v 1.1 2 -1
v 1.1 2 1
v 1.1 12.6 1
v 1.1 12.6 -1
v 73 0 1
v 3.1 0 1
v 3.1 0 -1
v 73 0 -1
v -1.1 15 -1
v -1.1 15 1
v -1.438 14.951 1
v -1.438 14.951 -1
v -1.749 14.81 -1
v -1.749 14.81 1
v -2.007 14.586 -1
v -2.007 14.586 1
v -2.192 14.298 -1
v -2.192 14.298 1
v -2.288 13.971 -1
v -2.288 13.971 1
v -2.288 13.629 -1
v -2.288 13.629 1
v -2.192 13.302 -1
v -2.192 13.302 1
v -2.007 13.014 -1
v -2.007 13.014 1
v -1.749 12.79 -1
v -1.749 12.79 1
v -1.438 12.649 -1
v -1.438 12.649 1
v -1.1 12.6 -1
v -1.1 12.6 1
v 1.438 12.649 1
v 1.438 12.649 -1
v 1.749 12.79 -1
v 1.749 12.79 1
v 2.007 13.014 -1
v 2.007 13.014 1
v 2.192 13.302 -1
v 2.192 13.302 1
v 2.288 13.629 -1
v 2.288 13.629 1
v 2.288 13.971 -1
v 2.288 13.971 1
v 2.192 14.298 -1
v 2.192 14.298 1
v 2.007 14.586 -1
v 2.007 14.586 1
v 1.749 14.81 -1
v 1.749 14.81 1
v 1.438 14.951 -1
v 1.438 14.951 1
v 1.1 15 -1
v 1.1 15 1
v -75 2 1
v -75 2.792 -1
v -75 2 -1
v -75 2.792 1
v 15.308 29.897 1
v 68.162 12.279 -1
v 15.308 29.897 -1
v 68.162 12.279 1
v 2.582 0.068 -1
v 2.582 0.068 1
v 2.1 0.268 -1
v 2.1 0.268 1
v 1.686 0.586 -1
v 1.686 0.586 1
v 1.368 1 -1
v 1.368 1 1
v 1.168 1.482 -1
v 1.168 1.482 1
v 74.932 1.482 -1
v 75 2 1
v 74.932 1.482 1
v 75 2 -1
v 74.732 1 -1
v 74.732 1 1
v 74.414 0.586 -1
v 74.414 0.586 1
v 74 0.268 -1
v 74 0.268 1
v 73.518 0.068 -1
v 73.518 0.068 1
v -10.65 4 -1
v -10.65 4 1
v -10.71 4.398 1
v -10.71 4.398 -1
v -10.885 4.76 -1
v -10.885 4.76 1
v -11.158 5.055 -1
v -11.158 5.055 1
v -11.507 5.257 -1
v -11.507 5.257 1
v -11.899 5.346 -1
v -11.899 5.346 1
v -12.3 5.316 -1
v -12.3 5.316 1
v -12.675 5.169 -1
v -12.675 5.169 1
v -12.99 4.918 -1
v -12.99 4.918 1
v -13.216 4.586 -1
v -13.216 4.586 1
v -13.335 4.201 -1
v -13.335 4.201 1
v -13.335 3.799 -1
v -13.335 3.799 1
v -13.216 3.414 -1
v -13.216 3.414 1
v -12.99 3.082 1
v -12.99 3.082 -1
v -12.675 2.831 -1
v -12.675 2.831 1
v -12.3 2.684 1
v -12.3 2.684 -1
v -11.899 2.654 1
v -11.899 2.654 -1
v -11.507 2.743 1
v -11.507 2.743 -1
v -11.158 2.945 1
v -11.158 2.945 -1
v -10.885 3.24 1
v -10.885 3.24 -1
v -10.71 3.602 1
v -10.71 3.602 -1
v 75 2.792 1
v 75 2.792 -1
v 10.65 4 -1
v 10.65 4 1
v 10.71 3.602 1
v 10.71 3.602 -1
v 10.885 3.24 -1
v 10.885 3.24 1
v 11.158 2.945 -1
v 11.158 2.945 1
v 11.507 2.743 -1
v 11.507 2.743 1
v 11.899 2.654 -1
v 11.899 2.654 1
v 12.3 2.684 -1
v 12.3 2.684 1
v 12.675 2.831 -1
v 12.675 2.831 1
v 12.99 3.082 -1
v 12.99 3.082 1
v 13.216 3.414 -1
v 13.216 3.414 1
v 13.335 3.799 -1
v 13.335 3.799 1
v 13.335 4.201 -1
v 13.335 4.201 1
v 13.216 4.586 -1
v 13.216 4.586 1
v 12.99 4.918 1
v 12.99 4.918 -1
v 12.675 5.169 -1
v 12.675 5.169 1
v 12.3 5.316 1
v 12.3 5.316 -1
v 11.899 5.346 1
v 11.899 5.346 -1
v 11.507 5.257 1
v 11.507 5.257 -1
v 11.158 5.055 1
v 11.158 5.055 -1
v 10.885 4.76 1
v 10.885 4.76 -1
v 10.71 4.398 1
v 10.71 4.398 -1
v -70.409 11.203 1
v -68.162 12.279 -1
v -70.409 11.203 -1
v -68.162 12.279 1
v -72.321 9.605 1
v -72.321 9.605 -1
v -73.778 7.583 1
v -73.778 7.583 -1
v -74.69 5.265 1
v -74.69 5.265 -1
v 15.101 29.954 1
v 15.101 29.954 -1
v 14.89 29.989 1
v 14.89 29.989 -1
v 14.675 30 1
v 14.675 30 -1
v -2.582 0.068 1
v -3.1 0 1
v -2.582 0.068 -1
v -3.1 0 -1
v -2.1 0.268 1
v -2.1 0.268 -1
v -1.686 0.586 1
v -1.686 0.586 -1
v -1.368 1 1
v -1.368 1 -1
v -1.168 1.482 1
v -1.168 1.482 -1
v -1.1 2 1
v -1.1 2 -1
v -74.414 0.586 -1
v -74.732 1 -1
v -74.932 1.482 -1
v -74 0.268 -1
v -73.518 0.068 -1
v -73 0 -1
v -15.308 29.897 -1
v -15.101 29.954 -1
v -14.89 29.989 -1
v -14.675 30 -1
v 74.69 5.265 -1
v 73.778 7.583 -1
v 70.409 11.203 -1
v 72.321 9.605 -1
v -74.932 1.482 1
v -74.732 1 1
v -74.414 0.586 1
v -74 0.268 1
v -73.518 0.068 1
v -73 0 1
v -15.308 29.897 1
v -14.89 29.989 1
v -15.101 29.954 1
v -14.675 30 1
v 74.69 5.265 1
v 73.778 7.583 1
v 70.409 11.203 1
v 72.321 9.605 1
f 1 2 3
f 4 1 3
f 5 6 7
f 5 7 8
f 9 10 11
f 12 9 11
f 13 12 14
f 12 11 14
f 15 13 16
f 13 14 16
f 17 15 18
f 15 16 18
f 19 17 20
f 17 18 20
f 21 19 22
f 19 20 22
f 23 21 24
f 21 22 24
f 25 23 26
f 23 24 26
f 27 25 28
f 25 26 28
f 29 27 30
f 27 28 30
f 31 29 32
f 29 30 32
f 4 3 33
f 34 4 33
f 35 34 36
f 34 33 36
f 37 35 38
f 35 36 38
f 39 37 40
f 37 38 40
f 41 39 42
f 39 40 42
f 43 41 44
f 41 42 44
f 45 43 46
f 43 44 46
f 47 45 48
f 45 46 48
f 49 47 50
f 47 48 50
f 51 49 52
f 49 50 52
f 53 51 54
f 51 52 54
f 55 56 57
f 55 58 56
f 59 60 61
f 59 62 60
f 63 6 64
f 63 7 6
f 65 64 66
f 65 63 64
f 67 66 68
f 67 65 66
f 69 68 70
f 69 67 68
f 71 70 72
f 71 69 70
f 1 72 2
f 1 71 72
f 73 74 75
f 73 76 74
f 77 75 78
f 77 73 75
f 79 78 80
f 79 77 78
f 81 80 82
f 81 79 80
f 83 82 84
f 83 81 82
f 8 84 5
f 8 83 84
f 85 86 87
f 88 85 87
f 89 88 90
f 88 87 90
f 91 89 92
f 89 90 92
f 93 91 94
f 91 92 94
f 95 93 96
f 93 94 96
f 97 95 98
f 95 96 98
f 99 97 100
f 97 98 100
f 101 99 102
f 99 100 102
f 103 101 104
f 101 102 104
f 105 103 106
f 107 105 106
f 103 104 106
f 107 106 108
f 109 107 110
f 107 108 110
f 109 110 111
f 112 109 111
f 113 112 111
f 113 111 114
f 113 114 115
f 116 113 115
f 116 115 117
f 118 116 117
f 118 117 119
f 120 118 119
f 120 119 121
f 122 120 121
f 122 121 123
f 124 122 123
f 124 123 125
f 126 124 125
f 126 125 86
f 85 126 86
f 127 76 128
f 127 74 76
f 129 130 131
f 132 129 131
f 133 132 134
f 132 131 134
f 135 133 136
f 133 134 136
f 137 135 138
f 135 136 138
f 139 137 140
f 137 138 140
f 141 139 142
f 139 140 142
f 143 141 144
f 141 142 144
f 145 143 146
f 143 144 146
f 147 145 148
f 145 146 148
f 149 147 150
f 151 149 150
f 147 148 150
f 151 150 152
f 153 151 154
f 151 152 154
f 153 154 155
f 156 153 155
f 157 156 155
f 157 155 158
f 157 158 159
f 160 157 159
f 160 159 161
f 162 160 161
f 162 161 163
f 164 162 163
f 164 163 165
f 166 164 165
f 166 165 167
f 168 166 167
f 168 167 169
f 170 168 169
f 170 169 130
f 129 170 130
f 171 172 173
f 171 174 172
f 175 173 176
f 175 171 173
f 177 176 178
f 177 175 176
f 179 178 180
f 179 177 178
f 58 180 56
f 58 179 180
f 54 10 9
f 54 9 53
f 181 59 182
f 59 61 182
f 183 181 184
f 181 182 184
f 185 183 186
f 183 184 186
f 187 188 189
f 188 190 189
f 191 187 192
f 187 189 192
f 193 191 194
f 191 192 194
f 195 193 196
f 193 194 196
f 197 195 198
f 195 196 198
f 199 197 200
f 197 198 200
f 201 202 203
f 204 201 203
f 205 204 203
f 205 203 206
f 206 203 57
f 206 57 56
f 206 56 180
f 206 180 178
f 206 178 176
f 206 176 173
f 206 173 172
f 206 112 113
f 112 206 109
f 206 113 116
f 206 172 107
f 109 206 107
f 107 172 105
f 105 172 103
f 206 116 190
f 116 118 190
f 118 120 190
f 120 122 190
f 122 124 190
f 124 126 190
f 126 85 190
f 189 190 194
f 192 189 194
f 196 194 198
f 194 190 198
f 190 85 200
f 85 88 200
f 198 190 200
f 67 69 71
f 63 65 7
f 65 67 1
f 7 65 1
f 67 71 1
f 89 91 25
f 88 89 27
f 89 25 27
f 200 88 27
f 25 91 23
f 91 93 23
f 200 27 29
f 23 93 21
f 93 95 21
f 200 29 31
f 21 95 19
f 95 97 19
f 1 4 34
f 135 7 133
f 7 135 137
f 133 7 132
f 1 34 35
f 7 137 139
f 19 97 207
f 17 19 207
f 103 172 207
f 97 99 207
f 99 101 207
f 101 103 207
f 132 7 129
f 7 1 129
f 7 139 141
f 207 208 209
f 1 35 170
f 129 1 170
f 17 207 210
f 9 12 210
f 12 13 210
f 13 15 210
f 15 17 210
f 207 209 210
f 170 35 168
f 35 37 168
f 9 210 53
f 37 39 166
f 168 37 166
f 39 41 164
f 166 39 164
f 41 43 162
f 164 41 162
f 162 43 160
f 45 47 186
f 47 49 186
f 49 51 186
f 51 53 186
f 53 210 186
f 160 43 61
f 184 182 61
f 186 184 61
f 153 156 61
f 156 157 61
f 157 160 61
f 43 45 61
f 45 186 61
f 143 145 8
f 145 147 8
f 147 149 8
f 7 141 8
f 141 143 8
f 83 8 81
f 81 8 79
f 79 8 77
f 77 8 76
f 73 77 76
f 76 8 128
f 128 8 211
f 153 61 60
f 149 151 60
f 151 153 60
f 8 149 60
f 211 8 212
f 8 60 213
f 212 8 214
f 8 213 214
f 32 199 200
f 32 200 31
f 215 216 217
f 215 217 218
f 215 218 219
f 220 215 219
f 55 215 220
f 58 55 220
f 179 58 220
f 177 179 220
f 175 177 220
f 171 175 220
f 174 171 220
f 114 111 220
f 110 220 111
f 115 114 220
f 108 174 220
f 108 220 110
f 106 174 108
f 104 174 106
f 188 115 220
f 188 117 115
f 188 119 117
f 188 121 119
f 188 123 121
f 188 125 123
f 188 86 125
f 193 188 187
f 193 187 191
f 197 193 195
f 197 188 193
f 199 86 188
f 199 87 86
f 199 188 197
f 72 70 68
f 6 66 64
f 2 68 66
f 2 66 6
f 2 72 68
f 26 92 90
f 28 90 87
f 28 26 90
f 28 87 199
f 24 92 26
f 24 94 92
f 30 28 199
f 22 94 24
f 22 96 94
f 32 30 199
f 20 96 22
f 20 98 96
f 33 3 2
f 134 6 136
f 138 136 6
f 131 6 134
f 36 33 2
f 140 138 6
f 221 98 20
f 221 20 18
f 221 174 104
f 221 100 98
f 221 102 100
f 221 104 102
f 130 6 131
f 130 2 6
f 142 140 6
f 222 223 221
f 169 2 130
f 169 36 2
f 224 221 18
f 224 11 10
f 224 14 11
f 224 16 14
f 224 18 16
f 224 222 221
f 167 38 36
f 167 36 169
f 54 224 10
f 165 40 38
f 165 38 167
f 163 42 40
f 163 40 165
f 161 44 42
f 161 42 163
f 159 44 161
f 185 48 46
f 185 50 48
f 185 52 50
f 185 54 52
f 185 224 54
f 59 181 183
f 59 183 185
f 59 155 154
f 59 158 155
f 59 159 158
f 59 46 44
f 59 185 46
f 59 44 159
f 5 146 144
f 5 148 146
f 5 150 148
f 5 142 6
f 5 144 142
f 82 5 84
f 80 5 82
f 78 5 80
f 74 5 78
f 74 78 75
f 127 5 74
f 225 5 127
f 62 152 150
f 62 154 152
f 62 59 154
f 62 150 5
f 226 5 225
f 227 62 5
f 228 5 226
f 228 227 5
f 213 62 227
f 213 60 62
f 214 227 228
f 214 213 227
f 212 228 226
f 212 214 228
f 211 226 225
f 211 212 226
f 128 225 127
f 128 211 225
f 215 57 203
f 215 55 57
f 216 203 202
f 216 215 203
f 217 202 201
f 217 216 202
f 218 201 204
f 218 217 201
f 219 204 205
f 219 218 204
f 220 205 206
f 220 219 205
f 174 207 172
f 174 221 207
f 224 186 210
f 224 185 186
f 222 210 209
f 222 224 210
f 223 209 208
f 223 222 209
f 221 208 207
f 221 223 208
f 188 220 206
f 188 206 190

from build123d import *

# Parameters (mm, degrees)
EXTRUDE_1_DEPTH     = 1
CUT_EXTRUDE_1_DEPTH = 81.802227692
SKETCH_4_R          = 1.35
CUT_EXTRUDE_3_DEPTH = 81.802227692
FILLET_1_R          = 10
FILLET_2_R          = 2


with BuildPart() as part:
    # 草图1 → 凸台-拉伸1 (new, symmetric)
    with BuildSketch(Plane.XY):
        Polygon((15, 30), (-15, 30), (-75, 10), (-75, 0), (75, 0), (75, 10), align=None)
    extrude(amount=EXTRUDE_1_DEPTH, both=True)

    # 草图2 → 切除-拉伸1 (cut, through all)
    with BuildSketch(Plane.XY.offset(1)):
        with BuildLine():
            Line((1.1, 15), (-1.1, 15))
            ThreePointArc((-1.1, 15), (-2.3, 13.8), (-1.1, 12.6))
            Line((-1.1, 12.6), (-1.1, 0))
            Line((-1.1, 0), (1.1, 0))
            Line((1.1, 0), (1.1, 12.6))
            ThreePointArc((1.1, 12.6), (2.3, 13.8), (1.1, 15))
        make_face()
    extrude(amount=-CUT_EXTRUDE_1_DEPTH, mode=Mode.SUBTRACT)

    # 草图4 → 切除-拉伸3 (cut, through all)
    with BuildSketch(Plane.XY.offset(1)):
        with Locations((-12, 4)):
            Circle(SKETCH_4_R)
        with Locations((12, 4)):
            Circle(SKETCH_4_R)
    extrude(amount=-CUT_EXTRUDE_3_DEPTH, mode=Mode.SUBTRACT)

    # 圆角1
    fillet_1_edges = [part.edges().sort_by_distance(p)[0] for p in [
        (-75, 10, 0),
        (75, 10, 0),
    ]]
    fillet(fillet_1_edges, radius=FILLET_1_R)

    # 圆角2
    fillet_2_edges = [part.edges().sort_by_distance(p)[0] for p in [
        (15, 30, 0),
        (-15, 30, 0),
        (75, 0, 0),
        (-75, 0, 0),
        (1.1, 0, 0),
        (-1.1, 0, 0),
    ]]
    fillet(fillet_2_edges, radius=FILLET_2_R)


solid = part.part
